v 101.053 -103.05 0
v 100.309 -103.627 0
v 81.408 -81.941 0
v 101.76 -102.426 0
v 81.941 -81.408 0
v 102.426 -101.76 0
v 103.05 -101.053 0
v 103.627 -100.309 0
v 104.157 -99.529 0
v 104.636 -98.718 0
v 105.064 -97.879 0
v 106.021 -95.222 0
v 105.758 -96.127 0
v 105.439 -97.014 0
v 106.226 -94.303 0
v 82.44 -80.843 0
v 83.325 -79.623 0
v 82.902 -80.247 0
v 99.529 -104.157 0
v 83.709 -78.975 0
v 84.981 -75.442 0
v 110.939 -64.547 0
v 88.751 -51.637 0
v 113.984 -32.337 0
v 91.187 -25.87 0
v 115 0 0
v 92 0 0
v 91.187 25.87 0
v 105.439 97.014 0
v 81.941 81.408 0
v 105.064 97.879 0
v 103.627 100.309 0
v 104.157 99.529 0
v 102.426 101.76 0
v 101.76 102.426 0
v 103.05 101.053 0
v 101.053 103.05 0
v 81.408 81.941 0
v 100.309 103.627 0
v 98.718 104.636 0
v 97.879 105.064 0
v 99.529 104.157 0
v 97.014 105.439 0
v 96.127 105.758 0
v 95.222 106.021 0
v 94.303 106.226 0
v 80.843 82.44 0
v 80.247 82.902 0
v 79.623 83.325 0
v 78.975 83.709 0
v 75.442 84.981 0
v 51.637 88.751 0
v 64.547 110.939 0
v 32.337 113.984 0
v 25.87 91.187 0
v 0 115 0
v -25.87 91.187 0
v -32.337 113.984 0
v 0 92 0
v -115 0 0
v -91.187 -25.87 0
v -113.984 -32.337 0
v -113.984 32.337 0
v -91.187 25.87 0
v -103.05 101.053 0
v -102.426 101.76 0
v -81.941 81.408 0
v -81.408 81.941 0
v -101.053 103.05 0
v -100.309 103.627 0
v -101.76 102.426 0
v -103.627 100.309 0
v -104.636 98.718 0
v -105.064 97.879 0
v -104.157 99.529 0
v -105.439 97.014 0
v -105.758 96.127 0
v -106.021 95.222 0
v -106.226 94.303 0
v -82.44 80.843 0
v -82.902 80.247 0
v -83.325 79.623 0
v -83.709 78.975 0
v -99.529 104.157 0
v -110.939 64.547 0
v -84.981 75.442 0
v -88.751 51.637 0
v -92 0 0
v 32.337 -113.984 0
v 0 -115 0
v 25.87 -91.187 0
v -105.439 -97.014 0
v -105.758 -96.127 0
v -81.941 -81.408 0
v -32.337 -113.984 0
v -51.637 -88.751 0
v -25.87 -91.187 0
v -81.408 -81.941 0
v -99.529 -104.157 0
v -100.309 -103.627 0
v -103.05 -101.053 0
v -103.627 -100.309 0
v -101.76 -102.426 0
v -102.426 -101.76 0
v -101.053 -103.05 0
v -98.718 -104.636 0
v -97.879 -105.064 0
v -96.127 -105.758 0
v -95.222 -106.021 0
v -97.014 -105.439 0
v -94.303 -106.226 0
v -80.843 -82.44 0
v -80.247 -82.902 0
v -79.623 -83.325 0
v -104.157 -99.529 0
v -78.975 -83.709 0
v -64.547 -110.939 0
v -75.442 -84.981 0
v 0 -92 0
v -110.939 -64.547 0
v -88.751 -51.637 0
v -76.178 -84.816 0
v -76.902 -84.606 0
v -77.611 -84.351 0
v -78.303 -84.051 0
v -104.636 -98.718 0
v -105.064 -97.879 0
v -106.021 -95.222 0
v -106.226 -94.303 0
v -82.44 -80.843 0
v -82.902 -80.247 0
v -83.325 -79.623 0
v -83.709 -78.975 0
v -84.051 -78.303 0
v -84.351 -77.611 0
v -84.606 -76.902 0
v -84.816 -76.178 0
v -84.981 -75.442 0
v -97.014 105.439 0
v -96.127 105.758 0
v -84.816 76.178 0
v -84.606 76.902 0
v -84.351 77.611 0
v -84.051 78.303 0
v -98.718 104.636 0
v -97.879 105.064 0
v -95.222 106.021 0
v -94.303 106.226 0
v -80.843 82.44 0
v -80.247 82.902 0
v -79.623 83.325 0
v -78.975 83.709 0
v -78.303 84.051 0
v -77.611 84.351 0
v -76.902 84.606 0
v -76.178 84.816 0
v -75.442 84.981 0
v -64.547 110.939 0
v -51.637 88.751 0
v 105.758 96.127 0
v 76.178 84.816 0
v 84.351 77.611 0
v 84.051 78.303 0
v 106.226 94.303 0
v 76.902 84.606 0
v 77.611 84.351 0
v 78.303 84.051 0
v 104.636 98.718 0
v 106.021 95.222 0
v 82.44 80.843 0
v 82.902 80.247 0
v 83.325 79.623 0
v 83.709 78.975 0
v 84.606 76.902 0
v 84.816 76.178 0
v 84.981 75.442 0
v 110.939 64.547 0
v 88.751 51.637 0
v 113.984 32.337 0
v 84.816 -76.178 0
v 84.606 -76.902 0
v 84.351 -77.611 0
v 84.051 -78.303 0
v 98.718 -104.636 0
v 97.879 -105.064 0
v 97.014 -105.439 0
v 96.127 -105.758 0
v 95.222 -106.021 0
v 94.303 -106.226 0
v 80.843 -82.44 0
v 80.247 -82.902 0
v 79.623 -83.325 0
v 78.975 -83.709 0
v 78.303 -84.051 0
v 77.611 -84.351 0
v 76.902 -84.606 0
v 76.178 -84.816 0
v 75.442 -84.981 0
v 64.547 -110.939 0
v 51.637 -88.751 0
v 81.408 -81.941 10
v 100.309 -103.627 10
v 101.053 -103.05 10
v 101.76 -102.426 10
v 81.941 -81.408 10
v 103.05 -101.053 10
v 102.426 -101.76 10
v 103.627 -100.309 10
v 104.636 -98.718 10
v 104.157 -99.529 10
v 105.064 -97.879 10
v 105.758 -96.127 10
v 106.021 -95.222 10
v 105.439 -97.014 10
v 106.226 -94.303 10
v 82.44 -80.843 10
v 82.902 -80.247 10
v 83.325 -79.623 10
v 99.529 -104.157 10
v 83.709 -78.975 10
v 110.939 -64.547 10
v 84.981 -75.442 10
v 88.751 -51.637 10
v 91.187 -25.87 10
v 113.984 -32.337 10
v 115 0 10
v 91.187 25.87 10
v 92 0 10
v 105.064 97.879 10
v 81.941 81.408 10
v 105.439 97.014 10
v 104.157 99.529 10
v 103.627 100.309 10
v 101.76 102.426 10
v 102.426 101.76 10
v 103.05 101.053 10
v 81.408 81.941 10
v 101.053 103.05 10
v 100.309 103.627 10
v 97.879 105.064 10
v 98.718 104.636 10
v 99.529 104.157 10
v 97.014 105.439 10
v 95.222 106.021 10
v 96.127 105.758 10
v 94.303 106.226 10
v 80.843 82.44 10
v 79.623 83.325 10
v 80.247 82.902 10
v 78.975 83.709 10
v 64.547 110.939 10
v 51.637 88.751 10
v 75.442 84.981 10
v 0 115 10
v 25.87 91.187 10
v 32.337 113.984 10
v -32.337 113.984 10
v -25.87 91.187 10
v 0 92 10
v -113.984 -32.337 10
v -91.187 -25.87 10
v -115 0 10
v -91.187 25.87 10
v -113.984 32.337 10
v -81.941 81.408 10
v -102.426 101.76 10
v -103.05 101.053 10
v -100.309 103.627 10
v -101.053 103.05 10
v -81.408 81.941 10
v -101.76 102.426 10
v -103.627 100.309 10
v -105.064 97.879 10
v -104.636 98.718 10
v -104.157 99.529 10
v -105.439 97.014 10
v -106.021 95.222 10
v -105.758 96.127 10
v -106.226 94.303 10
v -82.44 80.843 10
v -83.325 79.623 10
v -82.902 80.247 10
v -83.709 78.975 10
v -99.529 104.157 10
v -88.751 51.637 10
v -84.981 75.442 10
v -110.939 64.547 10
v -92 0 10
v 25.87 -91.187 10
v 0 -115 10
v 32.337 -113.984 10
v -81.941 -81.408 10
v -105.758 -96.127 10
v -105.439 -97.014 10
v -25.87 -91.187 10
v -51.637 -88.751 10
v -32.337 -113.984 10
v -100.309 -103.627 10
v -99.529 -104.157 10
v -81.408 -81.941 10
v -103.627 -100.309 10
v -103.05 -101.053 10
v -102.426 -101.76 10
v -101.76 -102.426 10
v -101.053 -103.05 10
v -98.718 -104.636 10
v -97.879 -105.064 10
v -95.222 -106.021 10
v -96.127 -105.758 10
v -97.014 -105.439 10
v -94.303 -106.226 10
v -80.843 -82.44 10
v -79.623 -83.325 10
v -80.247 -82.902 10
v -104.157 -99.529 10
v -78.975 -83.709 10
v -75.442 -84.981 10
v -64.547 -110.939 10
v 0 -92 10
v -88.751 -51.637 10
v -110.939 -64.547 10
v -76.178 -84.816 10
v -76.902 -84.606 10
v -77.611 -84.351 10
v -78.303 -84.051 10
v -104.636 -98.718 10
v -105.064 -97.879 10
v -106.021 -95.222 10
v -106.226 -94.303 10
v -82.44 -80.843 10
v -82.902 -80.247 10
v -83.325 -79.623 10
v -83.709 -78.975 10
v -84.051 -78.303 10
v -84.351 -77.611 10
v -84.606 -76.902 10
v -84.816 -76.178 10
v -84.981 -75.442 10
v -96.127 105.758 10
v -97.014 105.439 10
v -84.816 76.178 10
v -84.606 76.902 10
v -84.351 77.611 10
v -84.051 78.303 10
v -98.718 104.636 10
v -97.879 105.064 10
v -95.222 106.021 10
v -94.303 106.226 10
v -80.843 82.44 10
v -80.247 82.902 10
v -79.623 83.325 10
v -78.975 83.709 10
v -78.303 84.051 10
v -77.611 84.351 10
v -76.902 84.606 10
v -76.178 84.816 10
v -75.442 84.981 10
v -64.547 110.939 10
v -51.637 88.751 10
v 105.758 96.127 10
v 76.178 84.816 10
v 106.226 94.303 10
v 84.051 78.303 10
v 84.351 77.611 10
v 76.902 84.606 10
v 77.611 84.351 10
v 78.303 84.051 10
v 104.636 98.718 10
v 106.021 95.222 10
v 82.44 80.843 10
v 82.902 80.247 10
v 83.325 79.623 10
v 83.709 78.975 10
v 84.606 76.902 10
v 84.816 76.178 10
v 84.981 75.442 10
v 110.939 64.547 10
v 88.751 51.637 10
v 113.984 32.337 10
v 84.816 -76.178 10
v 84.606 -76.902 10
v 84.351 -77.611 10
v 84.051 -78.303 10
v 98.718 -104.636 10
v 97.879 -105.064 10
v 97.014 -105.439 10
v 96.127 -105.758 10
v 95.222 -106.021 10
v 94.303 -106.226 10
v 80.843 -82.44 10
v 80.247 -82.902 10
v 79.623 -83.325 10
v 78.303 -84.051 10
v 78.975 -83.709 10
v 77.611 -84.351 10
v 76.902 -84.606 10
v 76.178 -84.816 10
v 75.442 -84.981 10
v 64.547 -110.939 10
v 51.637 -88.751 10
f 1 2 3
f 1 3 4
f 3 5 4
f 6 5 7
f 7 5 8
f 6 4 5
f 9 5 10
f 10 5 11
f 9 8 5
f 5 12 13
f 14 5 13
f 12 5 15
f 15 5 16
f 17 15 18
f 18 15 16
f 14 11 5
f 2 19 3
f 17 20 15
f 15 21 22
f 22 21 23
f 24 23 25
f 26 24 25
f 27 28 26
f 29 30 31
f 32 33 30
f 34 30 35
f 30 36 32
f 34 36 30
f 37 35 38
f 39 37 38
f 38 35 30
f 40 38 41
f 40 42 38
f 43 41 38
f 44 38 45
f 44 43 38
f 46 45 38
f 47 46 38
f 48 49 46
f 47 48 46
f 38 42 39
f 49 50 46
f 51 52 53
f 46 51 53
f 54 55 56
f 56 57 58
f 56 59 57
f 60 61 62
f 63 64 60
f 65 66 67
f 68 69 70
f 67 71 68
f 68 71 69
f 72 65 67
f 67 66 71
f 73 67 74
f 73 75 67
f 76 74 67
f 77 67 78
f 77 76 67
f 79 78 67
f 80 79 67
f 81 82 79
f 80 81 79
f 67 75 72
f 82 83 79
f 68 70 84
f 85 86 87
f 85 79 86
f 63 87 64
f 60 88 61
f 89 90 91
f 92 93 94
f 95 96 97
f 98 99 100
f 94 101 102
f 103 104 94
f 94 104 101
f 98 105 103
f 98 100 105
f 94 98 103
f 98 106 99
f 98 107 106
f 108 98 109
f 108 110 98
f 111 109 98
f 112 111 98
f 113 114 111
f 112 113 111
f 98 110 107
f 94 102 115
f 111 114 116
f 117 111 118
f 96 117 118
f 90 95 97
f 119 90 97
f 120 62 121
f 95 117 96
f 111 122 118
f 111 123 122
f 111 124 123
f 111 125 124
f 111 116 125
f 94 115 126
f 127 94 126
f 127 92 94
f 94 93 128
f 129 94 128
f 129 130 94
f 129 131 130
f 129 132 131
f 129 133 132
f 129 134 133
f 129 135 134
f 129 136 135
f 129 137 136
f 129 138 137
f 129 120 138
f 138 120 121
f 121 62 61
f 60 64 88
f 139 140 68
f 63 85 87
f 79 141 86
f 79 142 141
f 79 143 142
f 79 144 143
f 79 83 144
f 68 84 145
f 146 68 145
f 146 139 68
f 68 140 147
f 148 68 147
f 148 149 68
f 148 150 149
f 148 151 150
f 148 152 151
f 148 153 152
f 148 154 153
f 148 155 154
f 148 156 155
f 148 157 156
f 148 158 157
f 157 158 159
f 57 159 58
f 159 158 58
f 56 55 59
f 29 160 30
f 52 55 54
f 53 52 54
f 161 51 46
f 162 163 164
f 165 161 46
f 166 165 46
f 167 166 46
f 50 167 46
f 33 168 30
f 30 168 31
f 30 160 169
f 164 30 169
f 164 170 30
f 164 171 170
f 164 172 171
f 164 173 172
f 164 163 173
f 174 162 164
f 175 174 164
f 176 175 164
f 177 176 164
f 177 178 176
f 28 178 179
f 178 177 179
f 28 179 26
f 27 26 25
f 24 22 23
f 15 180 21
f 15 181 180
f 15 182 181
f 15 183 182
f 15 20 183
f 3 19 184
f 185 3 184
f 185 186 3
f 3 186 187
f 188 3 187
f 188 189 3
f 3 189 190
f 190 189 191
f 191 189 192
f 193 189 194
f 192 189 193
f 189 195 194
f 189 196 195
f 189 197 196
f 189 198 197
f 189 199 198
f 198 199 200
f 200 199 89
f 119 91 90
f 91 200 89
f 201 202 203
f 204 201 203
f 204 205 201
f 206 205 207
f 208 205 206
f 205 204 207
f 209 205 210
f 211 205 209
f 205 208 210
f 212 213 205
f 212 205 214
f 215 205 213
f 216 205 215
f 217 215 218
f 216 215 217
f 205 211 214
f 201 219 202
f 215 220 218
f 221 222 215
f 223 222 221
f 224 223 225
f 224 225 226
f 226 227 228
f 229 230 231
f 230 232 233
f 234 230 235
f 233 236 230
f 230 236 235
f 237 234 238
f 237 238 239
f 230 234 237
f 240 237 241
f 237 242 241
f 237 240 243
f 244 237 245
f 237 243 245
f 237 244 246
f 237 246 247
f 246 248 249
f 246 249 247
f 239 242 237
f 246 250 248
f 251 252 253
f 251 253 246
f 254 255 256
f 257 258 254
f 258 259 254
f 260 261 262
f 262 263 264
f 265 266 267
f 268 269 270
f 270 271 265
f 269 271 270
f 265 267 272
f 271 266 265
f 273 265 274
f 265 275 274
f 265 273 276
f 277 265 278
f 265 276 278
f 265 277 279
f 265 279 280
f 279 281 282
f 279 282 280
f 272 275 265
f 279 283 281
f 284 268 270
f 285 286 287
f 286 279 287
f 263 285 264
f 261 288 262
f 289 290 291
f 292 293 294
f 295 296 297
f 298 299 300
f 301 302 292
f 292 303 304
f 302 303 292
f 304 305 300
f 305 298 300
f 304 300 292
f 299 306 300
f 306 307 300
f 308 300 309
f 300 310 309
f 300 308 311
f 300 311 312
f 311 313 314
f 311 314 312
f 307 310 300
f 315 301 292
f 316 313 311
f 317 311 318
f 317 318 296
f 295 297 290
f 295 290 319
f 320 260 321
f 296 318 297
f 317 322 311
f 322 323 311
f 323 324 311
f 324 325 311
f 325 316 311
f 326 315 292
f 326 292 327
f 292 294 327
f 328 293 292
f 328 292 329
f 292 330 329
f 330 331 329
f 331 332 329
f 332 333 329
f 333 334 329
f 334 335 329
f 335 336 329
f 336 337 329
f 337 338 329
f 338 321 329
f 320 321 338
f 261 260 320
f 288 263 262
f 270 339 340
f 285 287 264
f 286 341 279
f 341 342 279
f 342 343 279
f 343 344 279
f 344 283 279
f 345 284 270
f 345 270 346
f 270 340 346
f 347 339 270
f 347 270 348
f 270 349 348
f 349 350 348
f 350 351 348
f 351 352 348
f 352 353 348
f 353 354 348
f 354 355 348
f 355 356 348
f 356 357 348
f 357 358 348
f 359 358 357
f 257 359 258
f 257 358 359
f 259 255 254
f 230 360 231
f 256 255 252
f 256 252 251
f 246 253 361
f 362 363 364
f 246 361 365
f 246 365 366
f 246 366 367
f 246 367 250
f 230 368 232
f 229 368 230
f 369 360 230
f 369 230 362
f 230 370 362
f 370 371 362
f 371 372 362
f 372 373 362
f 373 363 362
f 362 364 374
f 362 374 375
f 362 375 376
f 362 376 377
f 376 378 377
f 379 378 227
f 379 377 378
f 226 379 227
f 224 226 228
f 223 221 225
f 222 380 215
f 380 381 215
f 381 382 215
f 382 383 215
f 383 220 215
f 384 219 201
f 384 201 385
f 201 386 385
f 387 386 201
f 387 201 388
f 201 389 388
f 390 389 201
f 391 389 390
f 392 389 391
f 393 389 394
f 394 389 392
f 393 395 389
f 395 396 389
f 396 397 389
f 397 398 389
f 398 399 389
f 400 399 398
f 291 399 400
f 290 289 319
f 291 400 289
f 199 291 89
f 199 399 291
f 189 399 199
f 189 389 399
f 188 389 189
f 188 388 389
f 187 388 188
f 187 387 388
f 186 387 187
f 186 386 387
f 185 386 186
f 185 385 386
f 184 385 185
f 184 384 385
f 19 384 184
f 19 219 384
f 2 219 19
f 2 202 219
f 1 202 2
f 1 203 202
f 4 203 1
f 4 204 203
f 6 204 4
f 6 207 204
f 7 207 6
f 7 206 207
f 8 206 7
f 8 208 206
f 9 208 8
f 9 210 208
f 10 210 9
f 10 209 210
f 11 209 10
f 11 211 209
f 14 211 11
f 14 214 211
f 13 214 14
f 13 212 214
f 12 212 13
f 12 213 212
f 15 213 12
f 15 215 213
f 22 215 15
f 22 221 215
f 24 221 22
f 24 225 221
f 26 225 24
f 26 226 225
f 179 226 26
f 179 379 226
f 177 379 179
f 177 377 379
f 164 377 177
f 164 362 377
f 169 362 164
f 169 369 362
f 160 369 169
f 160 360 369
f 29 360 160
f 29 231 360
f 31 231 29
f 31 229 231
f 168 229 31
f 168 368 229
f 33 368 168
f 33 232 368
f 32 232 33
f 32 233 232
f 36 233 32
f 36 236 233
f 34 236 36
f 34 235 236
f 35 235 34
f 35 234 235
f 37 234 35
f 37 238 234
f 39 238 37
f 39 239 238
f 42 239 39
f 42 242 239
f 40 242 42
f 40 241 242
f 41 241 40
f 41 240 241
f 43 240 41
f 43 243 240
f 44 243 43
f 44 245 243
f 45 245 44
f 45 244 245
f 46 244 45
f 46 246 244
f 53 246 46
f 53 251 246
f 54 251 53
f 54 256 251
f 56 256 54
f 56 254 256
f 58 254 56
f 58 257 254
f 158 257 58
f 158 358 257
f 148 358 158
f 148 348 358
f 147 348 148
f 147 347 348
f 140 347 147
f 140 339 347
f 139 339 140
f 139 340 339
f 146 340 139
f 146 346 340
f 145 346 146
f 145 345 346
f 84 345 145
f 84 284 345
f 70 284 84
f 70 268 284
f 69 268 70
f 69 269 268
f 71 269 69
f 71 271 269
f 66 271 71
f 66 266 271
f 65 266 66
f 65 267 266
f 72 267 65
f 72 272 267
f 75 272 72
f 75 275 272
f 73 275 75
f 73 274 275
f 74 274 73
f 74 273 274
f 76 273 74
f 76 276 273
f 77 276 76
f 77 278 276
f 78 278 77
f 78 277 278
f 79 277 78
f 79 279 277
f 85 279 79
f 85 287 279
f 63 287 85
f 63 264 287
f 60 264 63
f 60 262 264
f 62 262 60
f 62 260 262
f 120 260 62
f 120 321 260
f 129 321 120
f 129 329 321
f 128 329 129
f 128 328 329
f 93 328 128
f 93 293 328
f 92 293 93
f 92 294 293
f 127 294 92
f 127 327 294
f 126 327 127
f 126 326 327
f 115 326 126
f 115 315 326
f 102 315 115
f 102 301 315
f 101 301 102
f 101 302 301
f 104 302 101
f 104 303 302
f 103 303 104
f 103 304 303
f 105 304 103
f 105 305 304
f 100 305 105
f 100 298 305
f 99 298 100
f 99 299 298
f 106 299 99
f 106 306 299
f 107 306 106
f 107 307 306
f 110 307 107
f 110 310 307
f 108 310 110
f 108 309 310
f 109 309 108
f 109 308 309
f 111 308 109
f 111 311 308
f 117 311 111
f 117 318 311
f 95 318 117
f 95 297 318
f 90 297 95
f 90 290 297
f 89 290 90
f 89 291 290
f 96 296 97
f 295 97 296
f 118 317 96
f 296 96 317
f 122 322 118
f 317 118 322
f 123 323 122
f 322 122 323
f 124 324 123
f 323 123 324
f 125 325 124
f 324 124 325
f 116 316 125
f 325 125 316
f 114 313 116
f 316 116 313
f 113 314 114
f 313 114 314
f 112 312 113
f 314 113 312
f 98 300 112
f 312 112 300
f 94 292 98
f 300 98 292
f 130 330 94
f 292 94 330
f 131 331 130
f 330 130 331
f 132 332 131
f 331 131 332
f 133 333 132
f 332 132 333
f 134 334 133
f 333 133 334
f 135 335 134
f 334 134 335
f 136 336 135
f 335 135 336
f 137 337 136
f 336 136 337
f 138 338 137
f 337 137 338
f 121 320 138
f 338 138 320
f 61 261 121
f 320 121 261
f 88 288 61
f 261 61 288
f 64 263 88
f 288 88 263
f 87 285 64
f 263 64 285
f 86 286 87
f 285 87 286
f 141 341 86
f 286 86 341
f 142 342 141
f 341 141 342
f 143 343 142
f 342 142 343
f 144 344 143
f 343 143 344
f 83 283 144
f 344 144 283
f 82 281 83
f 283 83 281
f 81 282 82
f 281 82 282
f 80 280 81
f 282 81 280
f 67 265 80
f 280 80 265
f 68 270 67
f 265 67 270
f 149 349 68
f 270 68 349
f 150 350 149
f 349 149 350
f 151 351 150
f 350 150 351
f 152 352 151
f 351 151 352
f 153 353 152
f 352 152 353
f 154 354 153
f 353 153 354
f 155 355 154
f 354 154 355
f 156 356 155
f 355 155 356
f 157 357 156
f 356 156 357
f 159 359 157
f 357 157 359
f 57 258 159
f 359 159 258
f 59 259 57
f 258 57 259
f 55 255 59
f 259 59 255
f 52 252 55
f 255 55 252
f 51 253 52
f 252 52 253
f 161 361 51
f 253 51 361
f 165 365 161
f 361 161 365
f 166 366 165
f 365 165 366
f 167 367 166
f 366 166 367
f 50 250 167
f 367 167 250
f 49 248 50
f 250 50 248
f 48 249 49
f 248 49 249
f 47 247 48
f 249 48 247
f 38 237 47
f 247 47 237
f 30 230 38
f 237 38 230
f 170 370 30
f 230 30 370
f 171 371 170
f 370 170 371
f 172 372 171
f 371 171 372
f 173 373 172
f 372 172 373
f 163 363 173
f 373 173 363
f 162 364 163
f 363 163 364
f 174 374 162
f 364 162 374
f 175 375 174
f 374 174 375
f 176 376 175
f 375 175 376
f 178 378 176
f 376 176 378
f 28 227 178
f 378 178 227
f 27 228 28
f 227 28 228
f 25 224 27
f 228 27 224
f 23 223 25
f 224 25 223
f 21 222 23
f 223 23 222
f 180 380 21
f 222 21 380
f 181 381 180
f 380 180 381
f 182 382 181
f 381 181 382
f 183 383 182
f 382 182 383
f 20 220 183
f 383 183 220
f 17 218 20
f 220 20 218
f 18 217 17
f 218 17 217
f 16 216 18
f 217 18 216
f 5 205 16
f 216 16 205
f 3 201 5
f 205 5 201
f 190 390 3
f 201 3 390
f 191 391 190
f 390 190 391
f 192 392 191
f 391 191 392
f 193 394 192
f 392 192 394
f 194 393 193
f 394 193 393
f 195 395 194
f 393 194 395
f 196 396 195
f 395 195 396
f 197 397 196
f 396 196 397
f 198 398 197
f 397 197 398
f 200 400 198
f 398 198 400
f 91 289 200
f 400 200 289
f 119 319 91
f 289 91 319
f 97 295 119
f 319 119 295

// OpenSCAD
$fa=0.1;
$fn=100;

edge_radius=500;
shift=400;
corner_radius=15;
scale_factor=0.8;

linear_extrude(10) difference() {
    minkowski() {
        circle(corner_radius);
        intersection() {
            color("red")    translate([0, shift])  circle(edge_radius);
            color("green")  translate([0, -shift]) circle(edge_radius);
            color("blue")   translate([shift, 0])  circle(edge_radius);
            color("yellow") translate([-shift, 0]) circle(edge_radius);
        };
    };
    scale([scale_factor, scale_factor]) minkowski() {
        circle(corner_radius);
        intersection() {
            color("red")    translate([0, shift])  circle(edge_radius);
            color("green")  translate([0, -shift]) circle(edge_radius);
            color("blue")   translate([shift, 0])  circle(edge_radius);
            color("yellow") translate([-shift, 0]) circle(edge_radius);
        };
    };
}
